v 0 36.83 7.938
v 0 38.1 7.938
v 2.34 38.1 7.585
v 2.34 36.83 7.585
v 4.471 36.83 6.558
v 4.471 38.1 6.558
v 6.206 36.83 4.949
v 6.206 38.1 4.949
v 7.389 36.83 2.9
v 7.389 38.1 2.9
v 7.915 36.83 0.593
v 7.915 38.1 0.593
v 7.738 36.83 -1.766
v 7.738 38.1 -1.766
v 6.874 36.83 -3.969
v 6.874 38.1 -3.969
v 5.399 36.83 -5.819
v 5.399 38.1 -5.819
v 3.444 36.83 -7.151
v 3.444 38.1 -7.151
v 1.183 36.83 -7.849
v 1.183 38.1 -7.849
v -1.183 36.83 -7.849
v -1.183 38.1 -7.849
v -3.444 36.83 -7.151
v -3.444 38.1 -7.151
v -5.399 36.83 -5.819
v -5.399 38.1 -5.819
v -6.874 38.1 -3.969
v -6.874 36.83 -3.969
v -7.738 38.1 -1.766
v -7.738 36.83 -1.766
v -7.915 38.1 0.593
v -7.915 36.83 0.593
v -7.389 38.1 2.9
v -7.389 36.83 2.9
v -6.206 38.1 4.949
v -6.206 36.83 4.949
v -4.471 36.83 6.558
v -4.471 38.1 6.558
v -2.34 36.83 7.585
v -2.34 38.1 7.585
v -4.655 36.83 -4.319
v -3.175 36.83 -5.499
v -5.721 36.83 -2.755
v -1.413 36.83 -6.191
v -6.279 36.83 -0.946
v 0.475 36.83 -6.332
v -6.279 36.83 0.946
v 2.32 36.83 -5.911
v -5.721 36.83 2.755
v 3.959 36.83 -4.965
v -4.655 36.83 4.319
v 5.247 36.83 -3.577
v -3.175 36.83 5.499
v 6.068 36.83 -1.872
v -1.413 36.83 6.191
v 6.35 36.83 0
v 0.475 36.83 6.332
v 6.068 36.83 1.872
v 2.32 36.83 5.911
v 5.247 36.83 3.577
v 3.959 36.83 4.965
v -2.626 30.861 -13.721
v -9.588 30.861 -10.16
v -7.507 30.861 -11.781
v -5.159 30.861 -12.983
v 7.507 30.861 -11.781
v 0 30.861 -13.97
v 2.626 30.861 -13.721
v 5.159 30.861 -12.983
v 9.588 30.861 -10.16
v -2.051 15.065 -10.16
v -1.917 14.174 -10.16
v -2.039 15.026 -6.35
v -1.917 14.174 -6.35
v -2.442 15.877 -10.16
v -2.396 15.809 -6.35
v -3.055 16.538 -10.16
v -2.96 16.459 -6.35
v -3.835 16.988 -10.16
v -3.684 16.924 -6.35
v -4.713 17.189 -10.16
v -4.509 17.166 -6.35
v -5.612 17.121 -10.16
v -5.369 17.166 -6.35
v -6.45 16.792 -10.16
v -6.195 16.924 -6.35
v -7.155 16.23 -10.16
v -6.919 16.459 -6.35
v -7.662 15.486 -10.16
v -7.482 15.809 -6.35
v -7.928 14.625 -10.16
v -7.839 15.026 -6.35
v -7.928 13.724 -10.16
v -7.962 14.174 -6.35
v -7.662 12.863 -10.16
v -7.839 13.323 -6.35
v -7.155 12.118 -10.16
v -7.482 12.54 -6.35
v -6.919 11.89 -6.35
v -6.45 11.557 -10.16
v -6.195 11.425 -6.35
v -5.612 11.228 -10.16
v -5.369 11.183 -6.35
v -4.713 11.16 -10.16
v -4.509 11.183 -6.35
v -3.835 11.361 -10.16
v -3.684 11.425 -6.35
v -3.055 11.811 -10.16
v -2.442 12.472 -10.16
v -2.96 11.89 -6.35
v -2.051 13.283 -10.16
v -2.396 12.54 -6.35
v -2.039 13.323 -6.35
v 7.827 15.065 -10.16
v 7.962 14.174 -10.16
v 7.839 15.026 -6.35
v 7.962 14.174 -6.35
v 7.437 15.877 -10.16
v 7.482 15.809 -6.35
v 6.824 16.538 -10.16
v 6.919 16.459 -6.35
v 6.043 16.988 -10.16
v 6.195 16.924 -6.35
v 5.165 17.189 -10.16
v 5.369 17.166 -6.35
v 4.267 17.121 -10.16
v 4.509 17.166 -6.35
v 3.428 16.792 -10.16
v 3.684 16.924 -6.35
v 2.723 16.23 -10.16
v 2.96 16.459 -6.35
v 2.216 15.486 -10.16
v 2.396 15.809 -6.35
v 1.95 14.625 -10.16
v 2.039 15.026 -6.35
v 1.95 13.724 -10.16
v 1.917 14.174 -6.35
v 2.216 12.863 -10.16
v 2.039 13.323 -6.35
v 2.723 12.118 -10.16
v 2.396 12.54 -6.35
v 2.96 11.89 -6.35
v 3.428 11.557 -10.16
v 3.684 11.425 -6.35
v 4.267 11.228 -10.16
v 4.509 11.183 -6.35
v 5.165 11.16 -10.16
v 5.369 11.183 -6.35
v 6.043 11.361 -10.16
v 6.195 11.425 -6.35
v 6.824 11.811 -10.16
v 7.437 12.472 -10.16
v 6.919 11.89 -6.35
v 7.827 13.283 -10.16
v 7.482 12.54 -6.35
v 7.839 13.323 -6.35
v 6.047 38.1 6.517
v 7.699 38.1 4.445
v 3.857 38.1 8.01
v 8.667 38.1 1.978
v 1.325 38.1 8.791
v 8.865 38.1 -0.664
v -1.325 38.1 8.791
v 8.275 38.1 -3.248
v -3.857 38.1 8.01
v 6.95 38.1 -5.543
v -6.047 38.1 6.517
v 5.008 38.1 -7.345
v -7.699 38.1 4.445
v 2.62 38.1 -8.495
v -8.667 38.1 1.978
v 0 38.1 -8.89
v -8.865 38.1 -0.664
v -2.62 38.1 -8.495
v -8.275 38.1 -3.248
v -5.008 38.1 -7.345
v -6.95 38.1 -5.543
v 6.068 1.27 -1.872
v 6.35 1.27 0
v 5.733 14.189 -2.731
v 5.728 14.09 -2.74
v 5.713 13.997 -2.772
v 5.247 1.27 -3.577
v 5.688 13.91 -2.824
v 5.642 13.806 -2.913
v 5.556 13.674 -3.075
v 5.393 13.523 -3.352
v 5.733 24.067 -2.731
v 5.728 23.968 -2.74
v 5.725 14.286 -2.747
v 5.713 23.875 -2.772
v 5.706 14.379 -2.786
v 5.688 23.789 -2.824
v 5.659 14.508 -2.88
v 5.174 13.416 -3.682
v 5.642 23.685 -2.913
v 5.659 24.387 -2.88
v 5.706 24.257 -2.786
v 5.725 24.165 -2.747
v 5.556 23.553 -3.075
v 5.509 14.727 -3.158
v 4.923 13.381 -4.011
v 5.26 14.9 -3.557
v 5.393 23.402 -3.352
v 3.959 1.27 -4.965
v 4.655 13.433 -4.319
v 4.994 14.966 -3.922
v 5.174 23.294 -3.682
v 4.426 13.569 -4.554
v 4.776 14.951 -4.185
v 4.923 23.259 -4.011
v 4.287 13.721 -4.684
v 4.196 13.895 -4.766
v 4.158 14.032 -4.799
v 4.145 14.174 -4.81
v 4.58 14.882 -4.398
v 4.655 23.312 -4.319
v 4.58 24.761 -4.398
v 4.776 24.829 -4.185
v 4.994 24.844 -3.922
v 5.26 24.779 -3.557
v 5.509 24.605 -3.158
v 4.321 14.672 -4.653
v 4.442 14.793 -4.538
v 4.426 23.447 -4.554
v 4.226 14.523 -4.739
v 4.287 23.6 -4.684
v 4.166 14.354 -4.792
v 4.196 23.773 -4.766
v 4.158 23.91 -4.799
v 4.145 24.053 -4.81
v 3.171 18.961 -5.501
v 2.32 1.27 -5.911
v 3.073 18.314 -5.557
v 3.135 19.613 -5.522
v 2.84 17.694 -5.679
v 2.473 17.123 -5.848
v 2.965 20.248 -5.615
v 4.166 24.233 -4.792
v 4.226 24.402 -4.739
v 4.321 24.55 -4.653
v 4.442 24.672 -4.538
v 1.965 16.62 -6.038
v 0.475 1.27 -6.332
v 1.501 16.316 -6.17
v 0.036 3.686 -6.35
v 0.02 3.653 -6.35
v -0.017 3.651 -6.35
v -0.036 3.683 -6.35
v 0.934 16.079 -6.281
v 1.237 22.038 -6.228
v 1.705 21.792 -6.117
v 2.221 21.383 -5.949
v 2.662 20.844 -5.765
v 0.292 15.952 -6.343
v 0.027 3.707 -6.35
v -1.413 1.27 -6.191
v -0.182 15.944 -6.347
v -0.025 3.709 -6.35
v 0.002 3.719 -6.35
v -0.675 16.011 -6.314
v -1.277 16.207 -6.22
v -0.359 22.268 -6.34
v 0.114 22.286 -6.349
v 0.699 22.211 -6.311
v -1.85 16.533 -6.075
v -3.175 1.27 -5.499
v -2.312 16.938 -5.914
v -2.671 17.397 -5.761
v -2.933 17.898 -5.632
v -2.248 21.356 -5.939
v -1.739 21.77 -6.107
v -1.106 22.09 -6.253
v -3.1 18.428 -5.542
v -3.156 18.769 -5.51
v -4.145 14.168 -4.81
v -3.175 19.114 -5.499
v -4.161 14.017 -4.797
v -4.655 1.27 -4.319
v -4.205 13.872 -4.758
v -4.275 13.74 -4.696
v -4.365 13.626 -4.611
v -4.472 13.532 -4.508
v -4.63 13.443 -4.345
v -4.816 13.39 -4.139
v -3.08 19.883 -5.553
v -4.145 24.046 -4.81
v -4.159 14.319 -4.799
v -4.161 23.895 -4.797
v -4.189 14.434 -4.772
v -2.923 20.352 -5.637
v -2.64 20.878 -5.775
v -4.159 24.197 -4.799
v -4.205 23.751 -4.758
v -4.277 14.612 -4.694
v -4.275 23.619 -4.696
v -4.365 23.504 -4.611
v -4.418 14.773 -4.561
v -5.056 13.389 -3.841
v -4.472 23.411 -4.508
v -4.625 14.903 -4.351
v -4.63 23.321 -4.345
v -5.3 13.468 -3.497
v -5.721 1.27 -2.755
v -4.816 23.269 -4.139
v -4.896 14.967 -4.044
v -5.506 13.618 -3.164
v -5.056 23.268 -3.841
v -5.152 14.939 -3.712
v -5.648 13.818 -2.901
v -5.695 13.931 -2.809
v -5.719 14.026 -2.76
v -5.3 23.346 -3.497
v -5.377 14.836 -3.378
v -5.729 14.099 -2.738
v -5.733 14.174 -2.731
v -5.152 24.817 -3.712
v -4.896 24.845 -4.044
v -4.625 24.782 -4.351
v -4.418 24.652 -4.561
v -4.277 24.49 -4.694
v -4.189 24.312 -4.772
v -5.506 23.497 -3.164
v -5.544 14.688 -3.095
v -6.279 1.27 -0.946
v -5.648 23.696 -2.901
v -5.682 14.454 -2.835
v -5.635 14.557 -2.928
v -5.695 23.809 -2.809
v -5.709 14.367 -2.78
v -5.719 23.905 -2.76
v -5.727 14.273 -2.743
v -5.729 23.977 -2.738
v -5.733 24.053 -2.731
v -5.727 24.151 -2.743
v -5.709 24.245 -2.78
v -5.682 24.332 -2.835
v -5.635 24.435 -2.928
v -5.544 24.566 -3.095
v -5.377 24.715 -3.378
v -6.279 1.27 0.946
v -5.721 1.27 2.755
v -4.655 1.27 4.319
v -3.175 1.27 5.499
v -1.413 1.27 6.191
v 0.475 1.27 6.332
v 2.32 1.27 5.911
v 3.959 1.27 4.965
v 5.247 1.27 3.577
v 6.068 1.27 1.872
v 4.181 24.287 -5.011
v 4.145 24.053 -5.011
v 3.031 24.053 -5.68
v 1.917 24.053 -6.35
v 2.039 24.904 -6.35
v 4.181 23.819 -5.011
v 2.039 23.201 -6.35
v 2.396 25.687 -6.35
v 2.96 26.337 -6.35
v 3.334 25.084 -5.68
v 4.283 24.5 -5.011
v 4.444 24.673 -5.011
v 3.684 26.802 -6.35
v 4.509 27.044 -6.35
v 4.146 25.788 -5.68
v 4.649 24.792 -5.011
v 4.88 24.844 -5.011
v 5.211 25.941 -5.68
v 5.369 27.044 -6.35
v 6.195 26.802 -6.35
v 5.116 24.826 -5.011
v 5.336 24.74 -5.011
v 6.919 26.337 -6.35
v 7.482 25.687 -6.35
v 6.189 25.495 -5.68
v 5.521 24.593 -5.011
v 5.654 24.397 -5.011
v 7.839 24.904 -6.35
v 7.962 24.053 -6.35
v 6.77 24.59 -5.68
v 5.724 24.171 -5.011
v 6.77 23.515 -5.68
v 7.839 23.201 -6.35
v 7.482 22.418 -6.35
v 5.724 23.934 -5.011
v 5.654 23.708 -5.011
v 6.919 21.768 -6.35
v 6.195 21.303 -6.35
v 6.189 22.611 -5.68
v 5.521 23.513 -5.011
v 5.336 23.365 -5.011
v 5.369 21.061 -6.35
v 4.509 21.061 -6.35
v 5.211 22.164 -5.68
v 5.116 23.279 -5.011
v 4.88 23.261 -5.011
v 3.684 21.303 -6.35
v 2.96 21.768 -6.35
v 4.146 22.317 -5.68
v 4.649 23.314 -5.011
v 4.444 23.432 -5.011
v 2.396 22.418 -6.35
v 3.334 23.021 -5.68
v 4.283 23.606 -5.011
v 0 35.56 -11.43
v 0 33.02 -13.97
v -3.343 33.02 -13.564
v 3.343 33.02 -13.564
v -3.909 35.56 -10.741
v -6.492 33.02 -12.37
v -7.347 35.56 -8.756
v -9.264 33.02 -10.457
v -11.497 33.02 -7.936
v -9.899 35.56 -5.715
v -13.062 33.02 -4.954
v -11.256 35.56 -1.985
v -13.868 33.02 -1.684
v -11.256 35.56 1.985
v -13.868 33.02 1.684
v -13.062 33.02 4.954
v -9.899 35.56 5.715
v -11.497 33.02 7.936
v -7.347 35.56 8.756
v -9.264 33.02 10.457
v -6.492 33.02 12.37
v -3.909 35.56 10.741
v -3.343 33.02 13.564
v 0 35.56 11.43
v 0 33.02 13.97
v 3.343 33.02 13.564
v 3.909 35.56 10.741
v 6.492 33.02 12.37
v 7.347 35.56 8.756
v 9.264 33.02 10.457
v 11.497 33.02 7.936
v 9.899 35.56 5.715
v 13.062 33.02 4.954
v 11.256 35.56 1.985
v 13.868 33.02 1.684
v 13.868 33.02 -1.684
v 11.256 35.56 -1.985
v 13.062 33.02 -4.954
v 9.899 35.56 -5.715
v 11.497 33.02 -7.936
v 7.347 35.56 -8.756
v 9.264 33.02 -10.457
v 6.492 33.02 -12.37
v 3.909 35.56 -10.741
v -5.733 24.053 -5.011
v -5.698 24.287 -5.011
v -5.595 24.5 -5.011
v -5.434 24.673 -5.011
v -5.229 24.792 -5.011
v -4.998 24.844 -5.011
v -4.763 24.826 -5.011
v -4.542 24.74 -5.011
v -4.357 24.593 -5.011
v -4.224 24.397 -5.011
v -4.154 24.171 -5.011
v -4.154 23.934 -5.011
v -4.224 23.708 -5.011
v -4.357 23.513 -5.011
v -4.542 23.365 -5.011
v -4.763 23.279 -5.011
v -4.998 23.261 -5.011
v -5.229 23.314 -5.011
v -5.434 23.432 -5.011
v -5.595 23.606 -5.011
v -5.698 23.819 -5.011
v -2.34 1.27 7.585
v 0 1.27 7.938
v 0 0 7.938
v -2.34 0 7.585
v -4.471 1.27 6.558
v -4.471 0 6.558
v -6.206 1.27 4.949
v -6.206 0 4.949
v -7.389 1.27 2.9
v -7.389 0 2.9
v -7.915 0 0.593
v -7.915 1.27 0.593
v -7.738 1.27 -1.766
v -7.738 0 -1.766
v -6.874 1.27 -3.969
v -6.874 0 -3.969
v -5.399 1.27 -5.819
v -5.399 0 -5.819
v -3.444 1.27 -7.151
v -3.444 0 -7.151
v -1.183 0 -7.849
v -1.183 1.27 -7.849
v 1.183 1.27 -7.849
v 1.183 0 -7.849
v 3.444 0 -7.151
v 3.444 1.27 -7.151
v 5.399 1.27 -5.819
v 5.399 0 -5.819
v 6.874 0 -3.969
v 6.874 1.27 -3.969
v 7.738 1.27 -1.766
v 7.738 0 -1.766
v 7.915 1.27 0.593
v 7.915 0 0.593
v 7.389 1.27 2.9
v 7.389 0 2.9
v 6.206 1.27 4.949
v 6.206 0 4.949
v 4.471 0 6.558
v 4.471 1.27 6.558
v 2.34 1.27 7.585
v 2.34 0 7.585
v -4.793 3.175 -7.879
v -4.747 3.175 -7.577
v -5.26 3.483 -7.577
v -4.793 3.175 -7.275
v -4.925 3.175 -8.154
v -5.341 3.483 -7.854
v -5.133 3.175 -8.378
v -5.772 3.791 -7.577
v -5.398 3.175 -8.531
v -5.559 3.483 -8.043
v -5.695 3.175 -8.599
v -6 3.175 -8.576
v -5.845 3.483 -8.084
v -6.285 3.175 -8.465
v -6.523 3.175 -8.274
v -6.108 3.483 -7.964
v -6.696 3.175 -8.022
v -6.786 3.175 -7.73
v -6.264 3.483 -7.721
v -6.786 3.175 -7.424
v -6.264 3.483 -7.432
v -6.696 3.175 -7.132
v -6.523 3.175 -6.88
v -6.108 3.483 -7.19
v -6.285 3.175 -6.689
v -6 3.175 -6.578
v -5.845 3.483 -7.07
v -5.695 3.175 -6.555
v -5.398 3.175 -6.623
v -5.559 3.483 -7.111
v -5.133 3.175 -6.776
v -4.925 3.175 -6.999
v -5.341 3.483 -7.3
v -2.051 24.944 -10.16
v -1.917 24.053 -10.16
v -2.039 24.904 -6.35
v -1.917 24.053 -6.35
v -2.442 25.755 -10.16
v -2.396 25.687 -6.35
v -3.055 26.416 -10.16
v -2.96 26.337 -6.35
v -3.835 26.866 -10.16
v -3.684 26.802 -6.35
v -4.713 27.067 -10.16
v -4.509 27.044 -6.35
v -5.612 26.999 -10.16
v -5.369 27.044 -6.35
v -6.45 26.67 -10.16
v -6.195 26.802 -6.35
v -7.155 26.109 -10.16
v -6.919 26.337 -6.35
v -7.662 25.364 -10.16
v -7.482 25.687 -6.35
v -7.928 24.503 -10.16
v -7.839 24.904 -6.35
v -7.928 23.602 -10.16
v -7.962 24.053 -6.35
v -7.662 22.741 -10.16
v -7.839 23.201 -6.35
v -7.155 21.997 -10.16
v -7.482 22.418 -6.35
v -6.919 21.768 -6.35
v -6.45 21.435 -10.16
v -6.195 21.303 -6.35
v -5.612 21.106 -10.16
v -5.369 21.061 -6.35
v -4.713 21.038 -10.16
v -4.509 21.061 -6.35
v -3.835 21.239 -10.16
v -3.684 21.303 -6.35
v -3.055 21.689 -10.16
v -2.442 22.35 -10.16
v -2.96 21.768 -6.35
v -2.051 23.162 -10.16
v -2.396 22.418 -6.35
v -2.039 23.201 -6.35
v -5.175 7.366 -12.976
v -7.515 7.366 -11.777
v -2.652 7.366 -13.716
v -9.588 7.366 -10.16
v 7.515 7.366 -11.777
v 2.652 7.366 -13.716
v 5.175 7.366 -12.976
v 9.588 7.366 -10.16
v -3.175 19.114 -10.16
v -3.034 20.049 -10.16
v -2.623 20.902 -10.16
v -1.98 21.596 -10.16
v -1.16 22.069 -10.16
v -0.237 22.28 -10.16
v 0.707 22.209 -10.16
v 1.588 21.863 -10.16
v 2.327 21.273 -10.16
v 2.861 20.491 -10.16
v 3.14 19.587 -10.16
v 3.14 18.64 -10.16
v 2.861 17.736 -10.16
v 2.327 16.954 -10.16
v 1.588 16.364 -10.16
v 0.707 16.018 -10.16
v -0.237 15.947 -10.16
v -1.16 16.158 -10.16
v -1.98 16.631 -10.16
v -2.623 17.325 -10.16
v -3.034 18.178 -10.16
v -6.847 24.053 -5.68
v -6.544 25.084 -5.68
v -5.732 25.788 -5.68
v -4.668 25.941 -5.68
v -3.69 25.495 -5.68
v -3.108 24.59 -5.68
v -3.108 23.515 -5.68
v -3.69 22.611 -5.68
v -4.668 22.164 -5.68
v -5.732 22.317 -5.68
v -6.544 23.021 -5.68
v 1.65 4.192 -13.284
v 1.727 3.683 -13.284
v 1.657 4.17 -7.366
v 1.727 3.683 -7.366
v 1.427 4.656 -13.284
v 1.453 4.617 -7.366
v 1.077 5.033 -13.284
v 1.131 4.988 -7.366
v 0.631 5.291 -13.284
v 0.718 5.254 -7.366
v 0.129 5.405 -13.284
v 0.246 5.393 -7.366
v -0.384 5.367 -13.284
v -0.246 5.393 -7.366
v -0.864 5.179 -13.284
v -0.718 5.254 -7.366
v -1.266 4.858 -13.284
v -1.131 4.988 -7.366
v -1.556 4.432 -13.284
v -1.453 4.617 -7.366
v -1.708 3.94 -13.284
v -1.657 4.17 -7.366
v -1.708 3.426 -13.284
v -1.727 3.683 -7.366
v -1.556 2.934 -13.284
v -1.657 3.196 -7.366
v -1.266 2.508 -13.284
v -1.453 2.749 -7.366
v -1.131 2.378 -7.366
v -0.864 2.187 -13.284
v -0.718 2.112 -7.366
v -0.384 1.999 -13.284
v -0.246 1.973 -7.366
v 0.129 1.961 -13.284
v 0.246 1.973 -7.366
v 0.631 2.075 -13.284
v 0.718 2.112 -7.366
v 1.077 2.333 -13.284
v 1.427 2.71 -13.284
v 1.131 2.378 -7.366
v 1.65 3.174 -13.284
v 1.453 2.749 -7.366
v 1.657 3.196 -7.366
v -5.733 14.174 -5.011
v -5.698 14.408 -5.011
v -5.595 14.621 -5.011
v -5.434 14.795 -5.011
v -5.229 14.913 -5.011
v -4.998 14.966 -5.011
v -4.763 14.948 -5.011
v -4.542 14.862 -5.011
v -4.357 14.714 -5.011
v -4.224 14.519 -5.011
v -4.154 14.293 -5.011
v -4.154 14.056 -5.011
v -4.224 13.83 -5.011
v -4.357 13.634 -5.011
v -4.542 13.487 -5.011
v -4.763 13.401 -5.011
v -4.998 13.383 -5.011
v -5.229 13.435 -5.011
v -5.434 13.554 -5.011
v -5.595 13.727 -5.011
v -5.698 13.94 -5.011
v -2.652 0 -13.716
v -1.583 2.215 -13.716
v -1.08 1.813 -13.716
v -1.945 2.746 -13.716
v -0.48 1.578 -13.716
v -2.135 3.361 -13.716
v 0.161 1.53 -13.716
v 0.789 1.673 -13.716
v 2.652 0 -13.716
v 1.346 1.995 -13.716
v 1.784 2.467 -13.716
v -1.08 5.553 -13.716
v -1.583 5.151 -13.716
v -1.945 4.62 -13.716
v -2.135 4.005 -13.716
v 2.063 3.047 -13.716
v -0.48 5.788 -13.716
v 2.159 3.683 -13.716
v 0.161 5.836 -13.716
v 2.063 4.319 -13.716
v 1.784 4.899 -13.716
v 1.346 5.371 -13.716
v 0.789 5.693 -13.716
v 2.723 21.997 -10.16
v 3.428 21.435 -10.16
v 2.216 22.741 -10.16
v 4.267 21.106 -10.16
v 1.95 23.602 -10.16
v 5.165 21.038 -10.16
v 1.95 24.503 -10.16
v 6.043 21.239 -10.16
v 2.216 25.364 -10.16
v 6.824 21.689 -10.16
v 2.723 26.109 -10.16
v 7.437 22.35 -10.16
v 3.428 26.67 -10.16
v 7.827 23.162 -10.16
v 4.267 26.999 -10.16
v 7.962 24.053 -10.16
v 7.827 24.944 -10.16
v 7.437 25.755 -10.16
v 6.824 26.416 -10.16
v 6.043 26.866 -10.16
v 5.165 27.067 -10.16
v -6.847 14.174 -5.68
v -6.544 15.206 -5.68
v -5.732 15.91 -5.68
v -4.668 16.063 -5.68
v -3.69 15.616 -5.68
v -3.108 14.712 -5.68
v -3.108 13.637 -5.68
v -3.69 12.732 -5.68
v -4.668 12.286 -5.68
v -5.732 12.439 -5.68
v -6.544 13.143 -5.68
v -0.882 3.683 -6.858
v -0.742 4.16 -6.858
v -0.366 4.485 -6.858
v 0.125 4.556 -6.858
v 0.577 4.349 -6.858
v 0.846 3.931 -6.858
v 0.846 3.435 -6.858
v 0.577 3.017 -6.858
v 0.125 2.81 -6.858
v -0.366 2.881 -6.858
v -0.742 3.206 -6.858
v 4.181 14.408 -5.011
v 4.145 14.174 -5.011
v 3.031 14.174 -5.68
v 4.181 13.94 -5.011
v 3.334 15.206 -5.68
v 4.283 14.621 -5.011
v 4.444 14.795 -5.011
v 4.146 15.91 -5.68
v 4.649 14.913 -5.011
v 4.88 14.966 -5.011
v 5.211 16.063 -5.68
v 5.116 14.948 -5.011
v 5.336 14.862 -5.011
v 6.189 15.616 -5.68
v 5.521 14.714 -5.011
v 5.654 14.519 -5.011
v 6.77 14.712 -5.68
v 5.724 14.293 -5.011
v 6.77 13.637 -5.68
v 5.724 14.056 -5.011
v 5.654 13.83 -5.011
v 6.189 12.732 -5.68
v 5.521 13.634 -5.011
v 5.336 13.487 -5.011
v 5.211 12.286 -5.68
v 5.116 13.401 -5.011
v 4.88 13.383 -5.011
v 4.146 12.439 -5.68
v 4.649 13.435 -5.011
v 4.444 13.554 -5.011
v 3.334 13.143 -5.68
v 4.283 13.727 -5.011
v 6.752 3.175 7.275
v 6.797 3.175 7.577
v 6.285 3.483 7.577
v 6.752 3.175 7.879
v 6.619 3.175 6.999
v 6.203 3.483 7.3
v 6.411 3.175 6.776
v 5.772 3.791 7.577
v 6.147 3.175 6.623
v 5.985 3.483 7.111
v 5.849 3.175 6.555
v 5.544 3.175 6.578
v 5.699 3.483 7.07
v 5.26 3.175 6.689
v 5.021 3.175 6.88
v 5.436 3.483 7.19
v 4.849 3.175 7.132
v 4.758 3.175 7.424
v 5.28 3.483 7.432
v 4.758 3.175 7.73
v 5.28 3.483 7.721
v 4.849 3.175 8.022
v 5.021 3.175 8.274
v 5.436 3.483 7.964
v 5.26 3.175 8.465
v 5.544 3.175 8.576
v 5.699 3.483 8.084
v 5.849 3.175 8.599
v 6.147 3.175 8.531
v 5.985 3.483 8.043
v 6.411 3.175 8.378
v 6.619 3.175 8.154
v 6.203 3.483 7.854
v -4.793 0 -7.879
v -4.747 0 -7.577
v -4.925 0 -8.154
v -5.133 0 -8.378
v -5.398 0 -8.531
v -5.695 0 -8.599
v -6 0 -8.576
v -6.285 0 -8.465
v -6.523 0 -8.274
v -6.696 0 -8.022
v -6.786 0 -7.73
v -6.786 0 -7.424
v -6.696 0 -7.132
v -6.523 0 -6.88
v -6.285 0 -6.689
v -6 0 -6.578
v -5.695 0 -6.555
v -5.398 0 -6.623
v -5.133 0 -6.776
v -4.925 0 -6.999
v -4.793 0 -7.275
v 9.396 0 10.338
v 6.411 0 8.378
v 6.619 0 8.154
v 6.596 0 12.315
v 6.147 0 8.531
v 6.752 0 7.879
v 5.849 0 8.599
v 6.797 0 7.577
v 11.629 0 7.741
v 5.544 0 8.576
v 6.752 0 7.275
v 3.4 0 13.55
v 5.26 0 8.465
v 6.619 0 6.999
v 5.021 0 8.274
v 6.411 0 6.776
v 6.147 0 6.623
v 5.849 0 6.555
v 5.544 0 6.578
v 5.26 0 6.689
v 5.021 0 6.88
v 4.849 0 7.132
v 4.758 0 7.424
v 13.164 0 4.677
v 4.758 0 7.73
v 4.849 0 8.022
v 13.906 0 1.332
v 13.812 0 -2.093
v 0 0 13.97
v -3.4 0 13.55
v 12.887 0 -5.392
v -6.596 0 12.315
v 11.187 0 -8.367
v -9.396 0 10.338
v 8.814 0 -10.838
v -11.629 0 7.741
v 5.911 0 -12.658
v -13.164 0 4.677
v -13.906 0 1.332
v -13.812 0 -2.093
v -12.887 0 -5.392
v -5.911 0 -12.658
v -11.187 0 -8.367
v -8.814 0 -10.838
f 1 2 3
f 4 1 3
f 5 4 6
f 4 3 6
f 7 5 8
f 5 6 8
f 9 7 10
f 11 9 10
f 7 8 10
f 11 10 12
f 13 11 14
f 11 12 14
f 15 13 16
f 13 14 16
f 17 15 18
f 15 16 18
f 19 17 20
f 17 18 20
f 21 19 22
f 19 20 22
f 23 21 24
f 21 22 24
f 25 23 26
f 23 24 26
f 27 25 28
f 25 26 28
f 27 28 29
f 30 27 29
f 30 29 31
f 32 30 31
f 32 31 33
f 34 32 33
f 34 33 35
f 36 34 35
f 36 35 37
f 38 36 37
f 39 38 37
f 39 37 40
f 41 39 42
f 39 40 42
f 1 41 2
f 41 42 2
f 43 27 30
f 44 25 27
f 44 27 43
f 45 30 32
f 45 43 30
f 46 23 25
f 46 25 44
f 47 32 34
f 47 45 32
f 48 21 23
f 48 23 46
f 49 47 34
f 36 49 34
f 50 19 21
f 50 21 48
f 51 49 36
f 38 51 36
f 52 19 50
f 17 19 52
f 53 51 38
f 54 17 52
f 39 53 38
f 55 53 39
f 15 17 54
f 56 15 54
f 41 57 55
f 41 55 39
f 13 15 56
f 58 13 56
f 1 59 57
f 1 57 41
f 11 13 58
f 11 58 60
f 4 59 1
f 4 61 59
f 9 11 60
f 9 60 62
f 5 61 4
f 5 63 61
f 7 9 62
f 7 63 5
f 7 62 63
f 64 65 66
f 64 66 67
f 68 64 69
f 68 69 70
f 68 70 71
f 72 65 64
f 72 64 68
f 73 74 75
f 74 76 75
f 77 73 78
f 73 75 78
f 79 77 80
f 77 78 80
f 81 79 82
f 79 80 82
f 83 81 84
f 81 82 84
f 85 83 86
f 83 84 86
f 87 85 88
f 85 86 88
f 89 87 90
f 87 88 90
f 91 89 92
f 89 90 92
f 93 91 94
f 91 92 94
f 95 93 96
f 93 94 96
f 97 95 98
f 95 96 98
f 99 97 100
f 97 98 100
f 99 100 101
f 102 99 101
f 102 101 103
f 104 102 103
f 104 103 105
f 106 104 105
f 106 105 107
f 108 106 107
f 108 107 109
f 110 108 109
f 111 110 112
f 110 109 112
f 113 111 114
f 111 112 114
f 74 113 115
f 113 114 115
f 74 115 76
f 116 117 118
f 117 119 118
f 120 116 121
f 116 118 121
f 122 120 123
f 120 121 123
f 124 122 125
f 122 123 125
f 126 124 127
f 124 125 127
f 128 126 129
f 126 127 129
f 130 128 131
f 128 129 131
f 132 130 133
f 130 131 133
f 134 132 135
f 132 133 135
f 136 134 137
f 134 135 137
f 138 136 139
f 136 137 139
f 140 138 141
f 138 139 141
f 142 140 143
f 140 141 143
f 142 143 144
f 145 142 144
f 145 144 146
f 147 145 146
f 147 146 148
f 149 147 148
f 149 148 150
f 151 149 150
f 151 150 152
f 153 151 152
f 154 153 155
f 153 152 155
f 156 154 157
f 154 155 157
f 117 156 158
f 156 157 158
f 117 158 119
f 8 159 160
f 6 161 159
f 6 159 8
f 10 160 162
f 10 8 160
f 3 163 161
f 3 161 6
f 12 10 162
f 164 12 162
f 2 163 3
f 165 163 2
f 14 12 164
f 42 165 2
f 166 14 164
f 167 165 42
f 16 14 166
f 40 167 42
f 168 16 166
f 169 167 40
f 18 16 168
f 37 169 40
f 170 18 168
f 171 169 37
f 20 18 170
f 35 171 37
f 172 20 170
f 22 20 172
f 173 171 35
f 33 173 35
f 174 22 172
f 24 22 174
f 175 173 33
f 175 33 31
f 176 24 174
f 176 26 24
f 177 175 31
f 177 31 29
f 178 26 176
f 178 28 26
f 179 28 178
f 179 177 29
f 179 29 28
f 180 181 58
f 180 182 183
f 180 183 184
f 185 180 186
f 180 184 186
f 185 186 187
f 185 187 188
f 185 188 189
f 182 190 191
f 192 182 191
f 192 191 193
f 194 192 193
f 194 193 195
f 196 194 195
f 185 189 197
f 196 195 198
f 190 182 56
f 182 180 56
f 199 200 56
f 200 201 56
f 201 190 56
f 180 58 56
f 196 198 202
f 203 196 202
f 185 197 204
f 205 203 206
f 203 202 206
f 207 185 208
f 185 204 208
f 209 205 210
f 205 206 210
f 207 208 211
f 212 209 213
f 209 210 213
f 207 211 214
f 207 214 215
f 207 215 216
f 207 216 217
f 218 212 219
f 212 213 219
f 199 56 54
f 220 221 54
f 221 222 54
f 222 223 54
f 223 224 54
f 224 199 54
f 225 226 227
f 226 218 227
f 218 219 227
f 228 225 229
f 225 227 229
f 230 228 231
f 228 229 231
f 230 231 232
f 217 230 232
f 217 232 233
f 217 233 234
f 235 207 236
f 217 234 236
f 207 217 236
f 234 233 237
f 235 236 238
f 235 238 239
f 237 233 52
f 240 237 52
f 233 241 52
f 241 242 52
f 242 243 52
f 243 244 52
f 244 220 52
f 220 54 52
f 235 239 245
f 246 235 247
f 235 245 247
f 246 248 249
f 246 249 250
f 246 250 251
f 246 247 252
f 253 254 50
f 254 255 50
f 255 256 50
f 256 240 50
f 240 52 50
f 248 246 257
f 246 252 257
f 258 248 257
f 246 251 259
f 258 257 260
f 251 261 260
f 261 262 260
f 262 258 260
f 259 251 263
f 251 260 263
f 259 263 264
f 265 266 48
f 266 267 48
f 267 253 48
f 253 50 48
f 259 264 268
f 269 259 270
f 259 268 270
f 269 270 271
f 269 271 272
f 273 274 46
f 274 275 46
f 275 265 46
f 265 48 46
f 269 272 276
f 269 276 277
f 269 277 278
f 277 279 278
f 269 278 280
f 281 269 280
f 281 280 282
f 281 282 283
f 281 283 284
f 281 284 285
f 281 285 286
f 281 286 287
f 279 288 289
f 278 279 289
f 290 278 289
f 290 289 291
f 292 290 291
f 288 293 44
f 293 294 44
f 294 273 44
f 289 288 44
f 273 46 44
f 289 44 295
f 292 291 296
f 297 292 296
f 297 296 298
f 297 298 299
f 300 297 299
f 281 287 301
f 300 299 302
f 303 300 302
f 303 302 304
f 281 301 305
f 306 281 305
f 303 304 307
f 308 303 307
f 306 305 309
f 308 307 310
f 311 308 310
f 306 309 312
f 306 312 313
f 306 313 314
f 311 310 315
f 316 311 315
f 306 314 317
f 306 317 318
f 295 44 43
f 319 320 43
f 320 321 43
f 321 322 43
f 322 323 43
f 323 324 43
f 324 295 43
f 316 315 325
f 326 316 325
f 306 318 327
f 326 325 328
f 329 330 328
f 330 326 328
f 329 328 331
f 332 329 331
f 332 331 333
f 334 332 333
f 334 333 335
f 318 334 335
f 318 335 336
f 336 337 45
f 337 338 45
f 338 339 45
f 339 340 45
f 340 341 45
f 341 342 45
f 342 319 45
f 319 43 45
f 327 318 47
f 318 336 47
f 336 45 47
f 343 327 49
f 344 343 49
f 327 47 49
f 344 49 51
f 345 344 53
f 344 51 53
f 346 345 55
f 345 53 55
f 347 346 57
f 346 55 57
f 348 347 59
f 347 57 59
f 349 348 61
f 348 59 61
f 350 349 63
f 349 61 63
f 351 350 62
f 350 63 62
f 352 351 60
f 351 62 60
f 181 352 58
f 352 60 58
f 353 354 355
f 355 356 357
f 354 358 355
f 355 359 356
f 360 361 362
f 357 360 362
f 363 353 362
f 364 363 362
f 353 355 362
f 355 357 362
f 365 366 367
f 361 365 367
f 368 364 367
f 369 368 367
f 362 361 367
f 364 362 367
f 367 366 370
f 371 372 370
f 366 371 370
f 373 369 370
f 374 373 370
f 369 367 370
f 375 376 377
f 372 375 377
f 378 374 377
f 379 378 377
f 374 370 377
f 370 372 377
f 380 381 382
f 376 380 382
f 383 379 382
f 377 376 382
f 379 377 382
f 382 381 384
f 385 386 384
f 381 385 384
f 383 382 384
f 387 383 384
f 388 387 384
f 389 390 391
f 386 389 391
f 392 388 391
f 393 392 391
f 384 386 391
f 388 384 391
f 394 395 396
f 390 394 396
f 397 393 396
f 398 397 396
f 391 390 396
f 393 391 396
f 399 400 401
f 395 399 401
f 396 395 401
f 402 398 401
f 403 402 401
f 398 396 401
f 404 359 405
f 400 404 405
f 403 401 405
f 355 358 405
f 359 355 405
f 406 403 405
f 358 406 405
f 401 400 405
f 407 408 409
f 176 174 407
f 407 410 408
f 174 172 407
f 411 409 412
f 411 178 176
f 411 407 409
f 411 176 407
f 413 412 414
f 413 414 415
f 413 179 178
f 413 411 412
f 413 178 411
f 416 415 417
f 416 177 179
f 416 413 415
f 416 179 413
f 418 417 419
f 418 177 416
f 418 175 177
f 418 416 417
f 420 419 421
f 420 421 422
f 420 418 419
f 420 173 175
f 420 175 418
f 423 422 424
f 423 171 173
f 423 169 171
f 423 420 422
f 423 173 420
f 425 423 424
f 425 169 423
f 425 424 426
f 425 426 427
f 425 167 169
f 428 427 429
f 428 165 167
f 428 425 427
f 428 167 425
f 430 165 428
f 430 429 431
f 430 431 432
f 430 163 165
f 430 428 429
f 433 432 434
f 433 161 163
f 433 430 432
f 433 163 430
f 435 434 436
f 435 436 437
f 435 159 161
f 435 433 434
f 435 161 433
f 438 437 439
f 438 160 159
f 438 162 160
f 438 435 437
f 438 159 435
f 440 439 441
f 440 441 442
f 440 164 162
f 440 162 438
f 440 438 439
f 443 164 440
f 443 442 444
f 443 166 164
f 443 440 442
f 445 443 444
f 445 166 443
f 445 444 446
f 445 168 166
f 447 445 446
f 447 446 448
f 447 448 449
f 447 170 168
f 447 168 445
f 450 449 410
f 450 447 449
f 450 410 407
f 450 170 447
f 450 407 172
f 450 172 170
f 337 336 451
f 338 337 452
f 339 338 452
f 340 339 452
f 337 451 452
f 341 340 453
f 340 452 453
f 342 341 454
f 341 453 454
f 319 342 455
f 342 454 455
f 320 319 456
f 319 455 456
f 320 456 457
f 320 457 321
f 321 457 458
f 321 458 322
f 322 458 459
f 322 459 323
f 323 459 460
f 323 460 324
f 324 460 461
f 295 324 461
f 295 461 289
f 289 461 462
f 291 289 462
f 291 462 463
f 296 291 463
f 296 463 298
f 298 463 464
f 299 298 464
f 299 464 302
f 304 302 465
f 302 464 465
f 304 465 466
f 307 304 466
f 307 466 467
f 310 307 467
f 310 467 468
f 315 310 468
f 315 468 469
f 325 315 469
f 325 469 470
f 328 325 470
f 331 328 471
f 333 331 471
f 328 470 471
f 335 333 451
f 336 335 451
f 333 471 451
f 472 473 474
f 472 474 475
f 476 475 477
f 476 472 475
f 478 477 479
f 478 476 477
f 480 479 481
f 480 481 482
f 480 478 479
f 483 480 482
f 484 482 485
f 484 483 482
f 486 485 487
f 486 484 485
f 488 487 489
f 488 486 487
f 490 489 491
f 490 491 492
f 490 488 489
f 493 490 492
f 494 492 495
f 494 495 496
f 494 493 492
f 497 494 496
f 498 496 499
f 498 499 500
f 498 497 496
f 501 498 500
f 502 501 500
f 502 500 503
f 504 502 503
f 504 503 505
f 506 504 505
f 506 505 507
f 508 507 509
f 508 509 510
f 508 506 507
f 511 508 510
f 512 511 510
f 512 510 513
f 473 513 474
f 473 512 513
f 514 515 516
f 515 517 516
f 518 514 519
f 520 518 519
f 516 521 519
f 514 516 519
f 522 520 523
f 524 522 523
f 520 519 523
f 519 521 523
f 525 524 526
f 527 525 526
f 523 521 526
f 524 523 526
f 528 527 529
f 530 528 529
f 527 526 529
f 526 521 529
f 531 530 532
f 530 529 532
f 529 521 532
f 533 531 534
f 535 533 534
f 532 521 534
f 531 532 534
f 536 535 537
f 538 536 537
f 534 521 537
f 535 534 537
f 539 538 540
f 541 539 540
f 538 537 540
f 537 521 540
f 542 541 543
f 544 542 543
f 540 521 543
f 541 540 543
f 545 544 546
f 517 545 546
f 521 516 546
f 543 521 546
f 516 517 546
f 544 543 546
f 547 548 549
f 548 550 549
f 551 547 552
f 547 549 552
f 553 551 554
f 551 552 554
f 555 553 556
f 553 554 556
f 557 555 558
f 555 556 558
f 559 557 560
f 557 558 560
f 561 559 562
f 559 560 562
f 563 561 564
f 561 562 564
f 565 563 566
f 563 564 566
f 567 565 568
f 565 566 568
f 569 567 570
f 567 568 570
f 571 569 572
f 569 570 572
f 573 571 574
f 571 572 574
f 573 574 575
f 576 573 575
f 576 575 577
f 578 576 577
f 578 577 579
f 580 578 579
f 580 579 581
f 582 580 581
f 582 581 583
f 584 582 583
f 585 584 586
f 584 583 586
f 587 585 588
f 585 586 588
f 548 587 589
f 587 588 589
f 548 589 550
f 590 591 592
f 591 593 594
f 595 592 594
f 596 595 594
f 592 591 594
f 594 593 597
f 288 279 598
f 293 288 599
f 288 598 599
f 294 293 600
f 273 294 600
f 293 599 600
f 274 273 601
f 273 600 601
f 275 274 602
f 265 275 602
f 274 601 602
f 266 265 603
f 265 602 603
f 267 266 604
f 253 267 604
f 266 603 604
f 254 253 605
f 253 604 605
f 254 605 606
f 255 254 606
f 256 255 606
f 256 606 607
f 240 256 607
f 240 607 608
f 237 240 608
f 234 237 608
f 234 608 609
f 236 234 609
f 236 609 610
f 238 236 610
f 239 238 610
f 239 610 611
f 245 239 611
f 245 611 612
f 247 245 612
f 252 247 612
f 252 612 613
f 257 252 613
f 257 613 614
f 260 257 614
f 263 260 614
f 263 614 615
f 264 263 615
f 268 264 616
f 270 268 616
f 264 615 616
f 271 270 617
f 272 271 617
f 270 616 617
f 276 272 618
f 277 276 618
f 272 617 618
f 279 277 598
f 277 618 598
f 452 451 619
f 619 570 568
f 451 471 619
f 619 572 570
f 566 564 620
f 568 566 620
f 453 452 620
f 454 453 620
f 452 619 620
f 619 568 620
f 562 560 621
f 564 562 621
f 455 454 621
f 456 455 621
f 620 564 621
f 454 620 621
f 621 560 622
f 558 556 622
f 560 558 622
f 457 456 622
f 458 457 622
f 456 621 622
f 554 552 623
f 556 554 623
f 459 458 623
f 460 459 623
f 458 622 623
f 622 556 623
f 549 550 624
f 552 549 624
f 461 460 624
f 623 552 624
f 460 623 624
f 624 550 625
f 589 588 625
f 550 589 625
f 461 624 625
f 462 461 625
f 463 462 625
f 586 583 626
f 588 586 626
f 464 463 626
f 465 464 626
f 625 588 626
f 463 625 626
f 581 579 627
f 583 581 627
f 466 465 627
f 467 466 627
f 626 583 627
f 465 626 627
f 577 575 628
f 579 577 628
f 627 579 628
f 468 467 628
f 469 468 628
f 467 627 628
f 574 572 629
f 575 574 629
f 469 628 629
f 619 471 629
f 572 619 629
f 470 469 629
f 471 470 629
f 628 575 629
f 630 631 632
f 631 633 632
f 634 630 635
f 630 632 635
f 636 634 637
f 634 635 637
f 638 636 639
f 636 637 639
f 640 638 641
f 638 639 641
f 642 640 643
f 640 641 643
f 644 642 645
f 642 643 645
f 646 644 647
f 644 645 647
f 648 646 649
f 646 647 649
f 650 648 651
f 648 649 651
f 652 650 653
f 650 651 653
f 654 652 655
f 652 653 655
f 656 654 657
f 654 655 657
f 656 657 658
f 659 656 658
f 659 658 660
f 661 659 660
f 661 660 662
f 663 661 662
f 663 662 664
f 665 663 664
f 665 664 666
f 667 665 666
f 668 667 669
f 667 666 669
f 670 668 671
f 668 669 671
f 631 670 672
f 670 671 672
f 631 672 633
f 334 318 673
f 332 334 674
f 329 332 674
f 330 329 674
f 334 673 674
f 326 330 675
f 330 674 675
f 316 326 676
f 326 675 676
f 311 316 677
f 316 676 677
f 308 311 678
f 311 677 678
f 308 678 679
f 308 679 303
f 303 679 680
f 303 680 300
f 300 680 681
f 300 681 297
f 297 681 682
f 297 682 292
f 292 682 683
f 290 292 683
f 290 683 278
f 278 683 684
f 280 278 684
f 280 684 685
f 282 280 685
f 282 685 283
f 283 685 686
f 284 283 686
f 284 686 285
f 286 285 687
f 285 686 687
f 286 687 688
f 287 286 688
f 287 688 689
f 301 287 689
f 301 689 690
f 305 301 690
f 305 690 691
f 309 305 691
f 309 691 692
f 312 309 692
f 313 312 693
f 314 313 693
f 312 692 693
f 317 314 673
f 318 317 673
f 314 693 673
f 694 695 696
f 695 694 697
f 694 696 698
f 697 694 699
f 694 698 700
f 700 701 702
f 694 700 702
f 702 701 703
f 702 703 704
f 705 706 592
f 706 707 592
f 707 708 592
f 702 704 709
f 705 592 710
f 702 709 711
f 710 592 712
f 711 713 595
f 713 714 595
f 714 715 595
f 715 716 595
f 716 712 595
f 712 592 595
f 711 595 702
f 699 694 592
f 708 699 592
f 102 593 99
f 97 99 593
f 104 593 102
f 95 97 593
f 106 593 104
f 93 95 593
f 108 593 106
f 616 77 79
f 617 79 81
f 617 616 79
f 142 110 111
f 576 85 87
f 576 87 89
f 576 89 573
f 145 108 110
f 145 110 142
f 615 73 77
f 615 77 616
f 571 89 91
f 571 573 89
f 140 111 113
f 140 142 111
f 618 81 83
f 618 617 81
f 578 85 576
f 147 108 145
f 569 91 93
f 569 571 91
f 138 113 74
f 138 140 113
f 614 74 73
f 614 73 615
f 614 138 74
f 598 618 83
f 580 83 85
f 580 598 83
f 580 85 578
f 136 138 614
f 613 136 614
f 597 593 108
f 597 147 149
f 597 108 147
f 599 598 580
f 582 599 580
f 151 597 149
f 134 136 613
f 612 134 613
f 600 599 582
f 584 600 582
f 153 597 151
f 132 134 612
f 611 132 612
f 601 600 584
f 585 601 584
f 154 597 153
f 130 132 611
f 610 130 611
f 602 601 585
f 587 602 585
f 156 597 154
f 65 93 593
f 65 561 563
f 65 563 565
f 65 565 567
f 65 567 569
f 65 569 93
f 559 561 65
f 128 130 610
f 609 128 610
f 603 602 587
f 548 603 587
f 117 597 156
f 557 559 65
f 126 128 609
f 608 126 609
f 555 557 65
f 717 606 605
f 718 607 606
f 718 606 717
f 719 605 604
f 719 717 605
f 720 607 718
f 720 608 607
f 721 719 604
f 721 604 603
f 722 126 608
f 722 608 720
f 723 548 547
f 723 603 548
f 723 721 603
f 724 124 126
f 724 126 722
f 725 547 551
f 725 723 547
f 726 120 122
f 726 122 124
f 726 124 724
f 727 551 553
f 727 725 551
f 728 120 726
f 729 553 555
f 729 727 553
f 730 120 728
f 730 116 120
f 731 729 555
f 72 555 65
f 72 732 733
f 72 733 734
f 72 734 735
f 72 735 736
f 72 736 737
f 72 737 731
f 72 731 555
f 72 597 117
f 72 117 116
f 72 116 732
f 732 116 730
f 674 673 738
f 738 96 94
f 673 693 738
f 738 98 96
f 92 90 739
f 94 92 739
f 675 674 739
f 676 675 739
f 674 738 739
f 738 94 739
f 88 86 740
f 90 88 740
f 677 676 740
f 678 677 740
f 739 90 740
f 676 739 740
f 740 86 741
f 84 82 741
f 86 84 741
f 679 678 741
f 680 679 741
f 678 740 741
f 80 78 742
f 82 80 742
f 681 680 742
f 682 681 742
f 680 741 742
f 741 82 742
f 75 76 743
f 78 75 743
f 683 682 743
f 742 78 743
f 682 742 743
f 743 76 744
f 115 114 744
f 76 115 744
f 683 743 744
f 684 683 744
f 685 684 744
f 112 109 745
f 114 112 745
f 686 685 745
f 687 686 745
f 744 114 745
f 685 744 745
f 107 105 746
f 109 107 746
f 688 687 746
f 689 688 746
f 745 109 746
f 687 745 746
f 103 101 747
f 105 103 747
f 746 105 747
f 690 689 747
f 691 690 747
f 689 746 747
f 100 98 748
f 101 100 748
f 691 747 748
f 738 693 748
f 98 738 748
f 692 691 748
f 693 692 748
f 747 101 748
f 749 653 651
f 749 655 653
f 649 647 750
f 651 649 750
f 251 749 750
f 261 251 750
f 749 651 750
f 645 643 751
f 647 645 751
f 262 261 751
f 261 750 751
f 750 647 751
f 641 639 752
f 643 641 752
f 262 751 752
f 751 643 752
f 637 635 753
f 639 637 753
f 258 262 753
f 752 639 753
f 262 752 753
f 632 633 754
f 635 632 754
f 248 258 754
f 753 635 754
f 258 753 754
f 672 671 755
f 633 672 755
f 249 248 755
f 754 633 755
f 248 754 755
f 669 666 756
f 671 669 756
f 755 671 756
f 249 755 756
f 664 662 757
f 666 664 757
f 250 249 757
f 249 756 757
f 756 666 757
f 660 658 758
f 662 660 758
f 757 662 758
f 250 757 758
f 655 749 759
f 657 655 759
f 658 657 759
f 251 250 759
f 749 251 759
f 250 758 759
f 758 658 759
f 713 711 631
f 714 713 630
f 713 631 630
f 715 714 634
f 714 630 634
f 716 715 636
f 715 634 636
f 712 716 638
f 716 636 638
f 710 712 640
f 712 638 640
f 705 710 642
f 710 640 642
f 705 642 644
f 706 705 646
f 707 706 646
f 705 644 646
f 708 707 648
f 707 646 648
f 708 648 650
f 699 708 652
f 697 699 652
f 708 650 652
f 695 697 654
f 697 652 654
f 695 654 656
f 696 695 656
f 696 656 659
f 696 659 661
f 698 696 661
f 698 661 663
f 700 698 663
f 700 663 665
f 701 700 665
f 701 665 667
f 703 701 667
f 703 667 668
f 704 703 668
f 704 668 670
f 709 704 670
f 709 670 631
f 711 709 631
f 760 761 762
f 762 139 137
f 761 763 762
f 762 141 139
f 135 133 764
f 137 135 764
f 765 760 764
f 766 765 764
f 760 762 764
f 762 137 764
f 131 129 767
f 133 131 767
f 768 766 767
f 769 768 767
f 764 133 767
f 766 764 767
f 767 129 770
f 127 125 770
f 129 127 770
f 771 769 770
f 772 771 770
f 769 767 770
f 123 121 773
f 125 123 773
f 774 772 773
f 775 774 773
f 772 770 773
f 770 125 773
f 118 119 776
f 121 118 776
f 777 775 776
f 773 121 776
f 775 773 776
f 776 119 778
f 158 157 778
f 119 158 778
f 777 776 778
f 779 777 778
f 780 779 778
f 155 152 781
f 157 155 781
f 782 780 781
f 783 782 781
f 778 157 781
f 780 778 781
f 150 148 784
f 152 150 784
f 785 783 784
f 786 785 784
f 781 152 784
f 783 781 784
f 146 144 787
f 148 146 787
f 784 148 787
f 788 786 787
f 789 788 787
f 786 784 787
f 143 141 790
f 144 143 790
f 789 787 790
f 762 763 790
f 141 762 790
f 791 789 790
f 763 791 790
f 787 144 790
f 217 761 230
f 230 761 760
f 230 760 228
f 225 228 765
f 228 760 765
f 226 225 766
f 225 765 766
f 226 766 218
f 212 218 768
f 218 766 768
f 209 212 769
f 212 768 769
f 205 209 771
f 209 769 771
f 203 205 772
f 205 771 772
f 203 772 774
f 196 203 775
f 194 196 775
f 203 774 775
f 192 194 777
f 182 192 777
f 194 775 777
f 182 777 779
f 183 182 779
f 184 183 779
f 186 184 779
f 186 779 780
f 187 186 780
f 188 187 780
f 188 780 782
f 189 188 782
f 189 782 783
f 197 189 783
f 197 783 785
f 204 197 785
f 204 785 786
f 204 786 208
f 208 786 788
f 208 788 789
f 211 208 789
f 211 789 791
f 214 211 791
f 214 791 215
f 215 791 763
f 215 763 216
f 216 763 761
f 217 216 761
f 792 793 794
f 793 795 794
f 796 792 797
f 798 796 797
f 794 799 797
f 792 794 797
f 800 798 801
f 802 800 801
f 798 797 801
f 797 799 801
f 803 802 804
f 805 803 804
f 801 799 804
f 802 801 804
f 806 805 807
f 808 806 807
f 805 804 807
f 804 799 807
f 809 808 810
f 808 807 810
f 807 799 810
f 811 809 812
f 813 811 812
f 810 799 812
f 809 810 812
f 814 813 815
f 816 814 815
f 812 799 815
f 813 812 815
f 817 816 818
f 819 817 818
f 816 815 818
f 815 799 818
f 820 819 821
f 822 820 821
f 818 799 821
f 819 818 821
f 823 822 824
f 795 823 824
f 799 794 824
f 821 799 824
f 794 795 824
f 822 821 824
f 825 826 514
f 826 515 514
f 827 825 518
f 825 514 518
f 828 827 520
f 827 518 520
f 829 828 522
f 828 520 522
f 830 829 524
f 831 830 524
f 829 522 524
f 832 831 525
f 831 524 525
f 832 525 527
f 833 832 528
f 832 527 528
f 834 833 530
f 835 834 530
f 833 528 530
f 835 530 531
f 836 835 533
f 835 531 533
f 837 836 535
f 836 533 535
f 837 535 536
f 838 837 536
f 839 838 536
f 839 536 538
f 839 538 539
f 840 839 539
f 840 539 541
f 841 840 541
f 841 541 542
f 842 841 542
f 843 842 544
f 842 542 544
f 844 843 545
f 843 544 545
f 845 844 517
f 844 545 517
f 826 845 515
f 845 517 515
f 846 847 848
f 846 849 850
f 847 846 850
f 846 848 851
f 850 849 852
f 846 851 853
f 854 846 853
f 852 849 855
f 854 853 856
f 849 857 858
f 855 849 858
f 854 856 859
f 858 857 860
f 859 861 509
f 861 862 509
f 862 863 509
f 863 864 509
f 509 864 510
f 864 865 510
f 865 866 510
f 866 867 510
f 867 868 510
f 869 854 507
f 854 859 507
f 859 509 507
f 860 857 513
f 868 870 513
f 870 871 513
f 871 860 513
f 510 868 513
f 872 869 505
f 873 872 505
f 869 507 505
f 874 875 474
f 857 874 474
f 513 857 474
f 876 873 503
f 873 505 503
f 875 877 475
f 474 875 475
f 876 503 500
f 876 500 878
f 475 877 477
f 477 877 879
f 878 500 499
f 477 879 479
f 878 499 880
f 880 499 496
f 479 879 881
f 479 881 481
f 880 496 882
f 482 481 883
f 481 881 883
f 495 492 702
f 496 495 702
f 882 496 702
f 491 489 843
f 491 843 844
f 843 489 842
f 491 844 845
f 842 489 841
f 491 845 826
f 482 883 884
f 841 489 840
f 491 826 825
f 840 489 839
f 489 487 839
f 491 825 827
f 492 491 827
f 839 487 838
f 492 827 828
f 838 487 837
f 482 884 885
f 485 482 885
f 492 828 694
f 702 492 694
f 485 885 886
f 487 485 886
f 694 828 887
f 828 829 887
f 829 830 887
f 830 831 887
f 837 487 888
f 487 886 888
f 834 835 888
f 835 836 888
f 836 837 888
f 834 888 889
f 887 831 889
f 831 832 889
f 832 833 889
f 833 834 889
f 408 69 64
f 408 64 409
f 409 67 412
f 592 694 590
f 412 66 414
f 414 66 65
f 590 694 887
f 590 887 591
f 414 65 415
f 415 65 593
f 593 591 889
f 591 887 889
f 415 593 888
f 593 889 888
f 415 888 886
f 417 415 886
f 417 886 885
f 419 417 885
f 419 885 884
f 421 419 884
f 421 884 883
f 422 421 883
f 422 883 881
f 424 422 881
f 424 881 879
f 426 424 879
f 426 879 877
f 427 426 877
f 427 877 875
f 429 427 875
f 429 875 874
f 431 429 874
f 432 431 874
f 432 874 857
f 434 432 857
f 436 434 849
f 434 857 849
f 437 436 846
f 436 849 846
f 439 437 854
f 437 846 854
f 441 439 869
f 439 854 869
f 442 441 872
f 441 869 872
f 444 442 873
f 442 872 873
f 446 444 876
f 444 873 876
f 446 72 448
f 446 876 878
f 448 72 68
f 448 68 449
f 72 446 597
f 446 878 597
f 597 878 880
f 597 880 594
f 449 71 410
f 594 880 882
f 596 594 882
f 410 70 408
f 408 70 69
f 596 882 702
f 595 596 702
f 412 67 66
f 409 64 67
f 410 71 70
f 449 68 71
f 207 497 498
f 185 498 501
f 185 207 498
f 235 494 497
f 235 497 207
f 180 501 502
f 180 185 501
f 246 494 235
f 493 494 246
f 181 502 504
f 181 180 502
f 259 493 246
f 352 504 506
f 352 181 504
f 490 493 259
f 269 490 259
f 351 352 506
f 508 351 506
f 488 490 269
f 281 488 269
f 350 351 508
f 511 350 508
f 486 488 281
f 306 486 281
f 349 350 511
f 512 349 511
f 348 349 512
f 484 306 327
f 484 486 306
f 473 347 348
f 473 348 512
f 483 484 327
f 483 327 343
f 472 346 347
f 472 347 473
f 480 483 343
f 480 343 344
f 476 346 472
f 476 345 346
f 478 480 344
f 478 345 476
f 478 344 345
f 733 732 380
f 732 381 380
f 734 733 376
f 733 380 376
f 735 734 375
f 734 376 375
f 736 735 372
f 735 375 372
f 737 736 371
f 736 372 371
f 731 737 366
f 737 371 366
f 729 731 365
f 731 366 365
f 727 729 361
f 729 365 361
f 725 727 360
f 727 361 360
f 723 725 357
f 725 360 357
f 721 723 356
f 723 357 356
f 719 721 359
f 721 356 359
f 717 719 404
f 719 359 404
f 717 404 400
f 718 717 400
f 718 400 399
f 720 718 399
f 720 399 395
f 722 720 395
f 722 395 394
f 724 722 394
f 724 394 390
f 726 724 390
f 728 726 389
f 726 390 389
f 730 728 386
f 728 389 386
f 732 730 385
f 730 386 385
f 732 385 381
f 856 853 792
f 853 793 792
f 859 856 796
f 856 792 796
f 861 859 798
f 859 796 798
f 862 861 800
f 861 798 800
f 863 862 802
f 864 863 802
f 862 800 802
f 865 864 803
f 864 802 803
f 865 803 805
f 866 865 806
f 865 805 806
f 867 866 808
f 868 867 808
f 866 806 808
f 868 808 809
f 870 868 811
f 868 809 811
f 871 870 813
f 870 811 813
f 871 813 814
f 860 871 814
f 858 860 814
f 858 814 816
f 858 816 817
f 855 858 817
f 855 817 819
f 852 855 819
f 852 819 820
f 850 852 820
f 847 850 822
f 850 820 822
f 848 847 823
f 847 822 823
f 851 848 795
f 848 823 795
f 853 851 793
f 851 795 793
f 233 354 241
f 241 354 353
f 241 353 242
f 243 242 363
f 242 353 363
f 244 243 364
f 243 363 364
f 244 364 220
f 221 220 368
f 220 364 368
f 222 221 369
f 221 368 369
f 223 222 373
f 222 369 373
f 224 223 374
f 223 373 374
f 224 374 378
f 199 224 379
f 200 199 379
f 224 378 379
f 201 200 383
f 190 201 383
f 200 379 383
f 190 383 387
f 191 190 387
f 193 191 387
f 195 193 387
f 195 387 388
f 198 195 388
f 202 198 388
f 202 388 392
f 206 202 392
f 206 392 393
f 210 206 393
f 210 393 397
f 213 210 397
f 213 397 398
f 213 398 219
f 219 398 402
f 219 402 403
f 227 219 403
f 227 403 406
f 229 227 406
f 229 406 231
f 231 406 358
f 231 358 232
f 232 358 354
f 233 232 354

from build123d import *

# Parameters (mm, degrees)
SKETCH2_R                           = 13.97
BOSS_EXTRUDE1_DEPTH                 = 38.1
CHAMFER1_SIZE                       = 5.08
SKETCH5_R                           = 7.9375
CUT_EXTRUDE2_DEPTH                  = 1.27
SKETCH8_W                           = 3.81
SKETCH8_H                           = 23.495
CUT_EXTRUDE4_DEPTH                  = 12.7
SKETCH9_W                           = 12.7
SKETCH9_H                           = 0.508
CUT_EXTRUDE5_DEPTH                  = 9.525
F_1_2_0_5_DIAMETER_HOLE1_D          = 12.7
F_1_4_0_25_DIAMETER_HOLE1_REACH     = 49.213
F_1_4_0_25_DIAMETER_HOLE1_BORE_R    = 3.175
B_0_238_DIAMETER_HOLE1_D            = 6.0452
B_0_238_DIAMETER_HOLE1_DEPTH        = 3.81
B_0_238_DIAMETER_HOLE1_TIP          = 1.816161307
F_1_16_0_0625_DIAMETER_HOLE1_REACH  = 49.213
F_1_16_0_0625_DIAMETER_HOLE1_BORE_R = 0.79375
CUT_EXTRUDE6_START                  = -1.27
SKETCH21_R                          = 7.9375
CUT_EXTRUDE6_DEPTH                  = 1.27
F_8_32_TAPPED_HOLE1_D               = 3.4544
F_8_32_TAPPED_HOLE1_DEPTH           = 6.35
F_8_32_TAPPED_HOLE1_CSINK_D         = 4.318
F_8_32_TAPPED_HOLE1_CSINK_ANGLE     = 90
F_8_32_TAPPED_HOLE1_TIP             = 1.037806461


# Read off the part's stored shape, not the designer's step: M2.5x0.45 Tapped Hole1
with BuildPart() as part:
    # Sketch2 → Boss-Extrude1 (new body)
    with BuildSketch(Plane(origin=(0, 0, 0), x_dir=(1, 0, 0), z_dir=(0, 1, 0))):
        with Locations(Location((0, 0, 0), (0, 0, 90))):
            Circle(SKETCH2_R)
    extrude(amount=BOSS_EXTRUDE1_DEPTH)

    # Chamfer1
    chamfer1_edges = [part.edges().sort_by_distance(p)[0] for p in [
        (0, 38.1, 13.97),
    ]]
    chamfer(chamfer1_edges, length=CHAMFER1_SIZE)

    # Sketch5 → Cut-Extrude2 (cut)
    with BuildSketch(Plane(origin=(0, 38.1, 0), x_dir=(1, 0, 0), z_dir=(0, 1, 0))):
        with Locations(Location((0, 0, 0), (0, 0, 270))):
            Circle(SKETCH5_R)
    extrude(amount=-CUT_EXTRUDE2_DEPTH, mode=Mode.SUBTRACT)

    # Sketch8 → Cut-Extrude4 (cut, symmetric)
    with BuildSketch(Plane(origin=(0, 0, 0), x_dir=(0, 0, -1), z_dir=(1, 0, 0))):
        with Locations((12.065, 19.1135)):
            Rectangle(SKETCH8_W, SKETCH8_H)
    extrude(amount=CUT_EXTRUDE4_DEPTH, both=True, mode=Mode.SUBTRACT)

    # Sketch9 → Cut-Extrude5 (cut, symmetric)
    with BuildSketch(Plane(origin=(0, 0, 0), x_dir=(1, 0, 0), z_dir=(0, 1, 0))):
        with Locations((0, 13.97)):
            Rectangle(SKETCH9_W, SKETCH9_H)
    extrude(amount=CUT_EXTRUDE5_DEPTH, both=True, mode=Mode.SUBTRACT)

    # 1/2 (0.5) Diameter Hole1 (through all)
    with Locations(Plane(origin=(0, 0, 0), x_dir=(-1, 0, 0), z_dir=(0, -1, 0))):
        with Locations((0, 0)):
            Hole(F_1_2_0_5_DIAMETER_HOLE1_D / 2)

    # 1/4 (0.25) Diameter Hole1 bore → 1/4 (0.25) Diameter Hole1 (cut, up to next)
    with BuildSketch(Plane(origin=(0, 0, -10.16), x_dir=(-1, 0, 0), z_dir=(0, 0, -1)), mode=Mode.PRIVATE) as f_1_4_0_25_diameter_hole1_sk1:
        with Locations((0, 19.1135)):
            Circle(F_1_4_0_25_DIAMETER_HOLE1_BORE_R)
    f_1_4_0_25_diameter_hole1_tool1 = extrude(f_1_4_0_25_diameter_hole1_sk1.sketch, amount=-F_1_4_0_25_DIAMETER_HOLE1_REACH, mode=Mode.PRIVATE) & part.part
    add(f_1_4_0_25_diameter_hole1_tool1.solids().sort_by_distance((0, 19.1135, -10.16))[0], mode=Mode.SUBTRACT)

    # B (0.238) Diameter Hole1
    with Locations(Plane(origin=(0, 0, -10.16), x_dir=(-1, 0, 0), z_dir=(0, 0, -1))):
        with Locations((4.939140867, 24.052640867), (4.939140867, 14.174359133), (-4.939140867, 14.174359133), (-4.939140867, 24.052640867)):
            Hole(B_0_238_DIAMETER_HOLE1_D / 2, depth=B_0_238_DIAMETER_HOLE1_DEPTH)
            with Locations((0, 0, -(B_0_238_DIAMETER_HOLE1_DEPTH + B_0_238_DIAMETER_HOLE1_TIP / 2))):  # 118° drill point
                Cone(0, B_0_238_DIAMETER_HOLE1_D / 2, B_0_238_DIAMETER_HOLE1_TIP, mode=Mode.SUBTRACT)

    # 1/16 (0.0625) Diameter Hole1 bore → 1/16 (0.0625) Diameter Hole1 (cut, up to next)
    with BuildSketch(Plane(origin=(0, 0, -10.16), x_dir=(-1, 0, 0), z_dir=(0, 0, -1)), mode=Mode.PRIVATE) as f_1_16_0_0625_diameter_hole1_sk1:
        with Locations((4.939140867, 24.052640867)):
            Circle(F_1_16_0_0625_DIAMETER_HOLE1_BORE_R)
    f_1_16_0_0625_diameter_hole1_tool1 = extrude(f_1_16_0_0625_diameter_hole1_sk1.sketch, amount=-F_1_16_0_0625_DIAMETER_HOLE1_REACH, mode=Mode.PRIVATE) & part.part
    # 1/16 (0.0625) Diameter Hole1 bore → 1/16 (0.0625) Diameter Hole1 (cut, up to next)
    with BuildSketch(Plane(origin=(0, 0, -10.16), x_dir=(-1, 0, 0), z_dir=(0, 0, -1)), mode=Mode.PRIVATE) as f_1_16_0_0625_diameter_hole1_sk2:
        with Locations((4.939140867, 14.174359133)):
            Circle(F_1_16_0_0625_DIAMETER_HOLE1_BORE_R)
    f_1_16_0_0625_diameter_hole1_tool2 = extrude(f_1_16_0_0625_diameter_hole1_sk2.sketch, amount=-F_1_16_0_0625_DIAMETER_HOLE1_REACH, mode=Mode.PRIVATE) & part.part
    # 1/16 (0.0625) Diameter Hole1 bore → 1/16 (0.0625) Diameter Hole1 (cut, up to next)
    with BuildSketch(Plane(origin=(0, 0, -10.16), x_dir=(-1, 0, 0), z_dir=(0, 0, -1)), mode=Mode.PRIVATE) as f_1_16_0_0625_diameter_hole1_sk3:
        with Locations((-4.939140867, 14.174359133)):
            Circle(F_1_16_0_0625_DIAMETER_HOLE1_BORE_R)
    f_1_16_0_0625_diameter_hole1_tool3 = extrude(f_1_16_0_0625_diameter_hole1_sk3.sketch, amount=-F_1_16_0_0625_DIAMETER_HOLE1_REACH, mode=Mode.PRIVATE) & part.part
    # 1/16 (0.0625) Diameter Hole1 bore → 1/16 (0.0625) Diameter Hole1 (cut, up to next)
    with BuildSketch(Plane(origin=(0, 0, -10.16), x_dir=(-1, 0, 0), z_dir=(0, 0, -1)), mode=Mode.PRIVATE) as f_1_16_0_0625_diameter_hole1_sk4:
        with Locations((-4.939140867, 24.052640867)):
            Circle(F_1_16_0_0625_DIAMETER_HOLE1_BORE_R)
    f_1_16_0_0625_diameter_hole1_tool4 = extrude(f_1_16_0_0625_diameter_hole1_sk4.sketch, amount=-F_1_16_0_0625_DIAMETER_HOLE1_REACH, mode=Mode.PRIVATE) & part.part
    add(f_1_16_0_0625_diameter_hole1_tool1.solids().sort_by_distance((-4.939141, 24.052641, -10.16))[0], mode=Mode.SUBTRACT)
    add(f_1_16_0_0625_diameter_hole1_tool2.solids().sort_by_distance((-4.939141, 14.174359, -10.16))[0], mode=Mode.SUBTRACT)
    add(f_1_16_0_0625_diameter_hole1_tool3.solids().sort_by_distance((4.939141, 14.174359, -10.16))[0], mode=Mode.SUBTRACT)
    add(f_1_16_0_0625_diameter_hole1_tool4.solids().sort_by_distance((4.939141, 24.052641, -10.16))[0], mode=Mode.SUBTRACT)

    # Sketch21 → Cut-Extrude6 (cut)
    with BuildSketch(Plane.XZ.offset(CUT_EXTRUDE6_START)):
        with Locations(Location((0, 0, 0), (0, 0, 90))):
            Circle(SKETCH21_R)
    extrude(amount=CUT_EXTRUDE6_DEPTH, mode=Mode.SUBTRACT)

    # #8-32 Tapped Hole1
    with Locations(Plane(origin=(0, 0, -13.716), x_dir=(-1, 0, 0), z_dir=(0, 0, -1))):
        with Locations((0, 3.683)):
            CounterSinkHole(F_8_32_TAPPED_HOLE1_D / 2, F_8_32_TAPPED_HOLE1_CSINK_D / 2, depth=F_8_32_TAPPED_HOLE1_DEPTH, counter_sink_angle=F_8_32_TAPPED_HOLE1_CSINK_ANGLE)
            with Locations((0, 0, -(F_8_32_TAPPED_HOLE1_DEPTH + F_8_32_TAPPED_HOLE1_TIP / 2))):  # 118° drill point
                Cone(0, F_8_32_TAPPED_HOLE1_D / 2, F_8_32_TAPPED_HOLE1_TIP, mode=Mode.SUBTRACT)

    # M2.5x0.45 Tapped Hole1 outline → M2.5x0.45 Tapped Hole1 (revolve, cut)
    with BuildSketch(Plane(origin=(-5.772039513, 0, -7.576884905), x_dir=(1, 0, 0), z_dir=(0, 0, 1))):
        Polygon((1.025, 3.175), (0, 3.790882135), (0, 0), (1.025, 0), align=None)
    revolve(axis=Axis((-5.772039513, 0, -7.576884905), (0, 1, 0)), mode=Mode.SUBTRACT)

    # M2.5x0.45 Tapped Hole1 2 outline → M2.5x0.45 Tapped Hole1 2 (revolve, cut)
    with BuildSketch(Plane(origin=(5.772039513, 0, 7.576884905), x_dir=(1, 0, 0), z_dir=(0, 0, 1))):
        Polygon((1.025, 3.175), (0, 3.790882135), (0, 0), (1.025, 0), align=None)
    revolve(axis=Axis((5.772039513, 0, 7.576884905), (0, 1, 0)), mode=Mode.SUBTRACT)


solid = part.part
